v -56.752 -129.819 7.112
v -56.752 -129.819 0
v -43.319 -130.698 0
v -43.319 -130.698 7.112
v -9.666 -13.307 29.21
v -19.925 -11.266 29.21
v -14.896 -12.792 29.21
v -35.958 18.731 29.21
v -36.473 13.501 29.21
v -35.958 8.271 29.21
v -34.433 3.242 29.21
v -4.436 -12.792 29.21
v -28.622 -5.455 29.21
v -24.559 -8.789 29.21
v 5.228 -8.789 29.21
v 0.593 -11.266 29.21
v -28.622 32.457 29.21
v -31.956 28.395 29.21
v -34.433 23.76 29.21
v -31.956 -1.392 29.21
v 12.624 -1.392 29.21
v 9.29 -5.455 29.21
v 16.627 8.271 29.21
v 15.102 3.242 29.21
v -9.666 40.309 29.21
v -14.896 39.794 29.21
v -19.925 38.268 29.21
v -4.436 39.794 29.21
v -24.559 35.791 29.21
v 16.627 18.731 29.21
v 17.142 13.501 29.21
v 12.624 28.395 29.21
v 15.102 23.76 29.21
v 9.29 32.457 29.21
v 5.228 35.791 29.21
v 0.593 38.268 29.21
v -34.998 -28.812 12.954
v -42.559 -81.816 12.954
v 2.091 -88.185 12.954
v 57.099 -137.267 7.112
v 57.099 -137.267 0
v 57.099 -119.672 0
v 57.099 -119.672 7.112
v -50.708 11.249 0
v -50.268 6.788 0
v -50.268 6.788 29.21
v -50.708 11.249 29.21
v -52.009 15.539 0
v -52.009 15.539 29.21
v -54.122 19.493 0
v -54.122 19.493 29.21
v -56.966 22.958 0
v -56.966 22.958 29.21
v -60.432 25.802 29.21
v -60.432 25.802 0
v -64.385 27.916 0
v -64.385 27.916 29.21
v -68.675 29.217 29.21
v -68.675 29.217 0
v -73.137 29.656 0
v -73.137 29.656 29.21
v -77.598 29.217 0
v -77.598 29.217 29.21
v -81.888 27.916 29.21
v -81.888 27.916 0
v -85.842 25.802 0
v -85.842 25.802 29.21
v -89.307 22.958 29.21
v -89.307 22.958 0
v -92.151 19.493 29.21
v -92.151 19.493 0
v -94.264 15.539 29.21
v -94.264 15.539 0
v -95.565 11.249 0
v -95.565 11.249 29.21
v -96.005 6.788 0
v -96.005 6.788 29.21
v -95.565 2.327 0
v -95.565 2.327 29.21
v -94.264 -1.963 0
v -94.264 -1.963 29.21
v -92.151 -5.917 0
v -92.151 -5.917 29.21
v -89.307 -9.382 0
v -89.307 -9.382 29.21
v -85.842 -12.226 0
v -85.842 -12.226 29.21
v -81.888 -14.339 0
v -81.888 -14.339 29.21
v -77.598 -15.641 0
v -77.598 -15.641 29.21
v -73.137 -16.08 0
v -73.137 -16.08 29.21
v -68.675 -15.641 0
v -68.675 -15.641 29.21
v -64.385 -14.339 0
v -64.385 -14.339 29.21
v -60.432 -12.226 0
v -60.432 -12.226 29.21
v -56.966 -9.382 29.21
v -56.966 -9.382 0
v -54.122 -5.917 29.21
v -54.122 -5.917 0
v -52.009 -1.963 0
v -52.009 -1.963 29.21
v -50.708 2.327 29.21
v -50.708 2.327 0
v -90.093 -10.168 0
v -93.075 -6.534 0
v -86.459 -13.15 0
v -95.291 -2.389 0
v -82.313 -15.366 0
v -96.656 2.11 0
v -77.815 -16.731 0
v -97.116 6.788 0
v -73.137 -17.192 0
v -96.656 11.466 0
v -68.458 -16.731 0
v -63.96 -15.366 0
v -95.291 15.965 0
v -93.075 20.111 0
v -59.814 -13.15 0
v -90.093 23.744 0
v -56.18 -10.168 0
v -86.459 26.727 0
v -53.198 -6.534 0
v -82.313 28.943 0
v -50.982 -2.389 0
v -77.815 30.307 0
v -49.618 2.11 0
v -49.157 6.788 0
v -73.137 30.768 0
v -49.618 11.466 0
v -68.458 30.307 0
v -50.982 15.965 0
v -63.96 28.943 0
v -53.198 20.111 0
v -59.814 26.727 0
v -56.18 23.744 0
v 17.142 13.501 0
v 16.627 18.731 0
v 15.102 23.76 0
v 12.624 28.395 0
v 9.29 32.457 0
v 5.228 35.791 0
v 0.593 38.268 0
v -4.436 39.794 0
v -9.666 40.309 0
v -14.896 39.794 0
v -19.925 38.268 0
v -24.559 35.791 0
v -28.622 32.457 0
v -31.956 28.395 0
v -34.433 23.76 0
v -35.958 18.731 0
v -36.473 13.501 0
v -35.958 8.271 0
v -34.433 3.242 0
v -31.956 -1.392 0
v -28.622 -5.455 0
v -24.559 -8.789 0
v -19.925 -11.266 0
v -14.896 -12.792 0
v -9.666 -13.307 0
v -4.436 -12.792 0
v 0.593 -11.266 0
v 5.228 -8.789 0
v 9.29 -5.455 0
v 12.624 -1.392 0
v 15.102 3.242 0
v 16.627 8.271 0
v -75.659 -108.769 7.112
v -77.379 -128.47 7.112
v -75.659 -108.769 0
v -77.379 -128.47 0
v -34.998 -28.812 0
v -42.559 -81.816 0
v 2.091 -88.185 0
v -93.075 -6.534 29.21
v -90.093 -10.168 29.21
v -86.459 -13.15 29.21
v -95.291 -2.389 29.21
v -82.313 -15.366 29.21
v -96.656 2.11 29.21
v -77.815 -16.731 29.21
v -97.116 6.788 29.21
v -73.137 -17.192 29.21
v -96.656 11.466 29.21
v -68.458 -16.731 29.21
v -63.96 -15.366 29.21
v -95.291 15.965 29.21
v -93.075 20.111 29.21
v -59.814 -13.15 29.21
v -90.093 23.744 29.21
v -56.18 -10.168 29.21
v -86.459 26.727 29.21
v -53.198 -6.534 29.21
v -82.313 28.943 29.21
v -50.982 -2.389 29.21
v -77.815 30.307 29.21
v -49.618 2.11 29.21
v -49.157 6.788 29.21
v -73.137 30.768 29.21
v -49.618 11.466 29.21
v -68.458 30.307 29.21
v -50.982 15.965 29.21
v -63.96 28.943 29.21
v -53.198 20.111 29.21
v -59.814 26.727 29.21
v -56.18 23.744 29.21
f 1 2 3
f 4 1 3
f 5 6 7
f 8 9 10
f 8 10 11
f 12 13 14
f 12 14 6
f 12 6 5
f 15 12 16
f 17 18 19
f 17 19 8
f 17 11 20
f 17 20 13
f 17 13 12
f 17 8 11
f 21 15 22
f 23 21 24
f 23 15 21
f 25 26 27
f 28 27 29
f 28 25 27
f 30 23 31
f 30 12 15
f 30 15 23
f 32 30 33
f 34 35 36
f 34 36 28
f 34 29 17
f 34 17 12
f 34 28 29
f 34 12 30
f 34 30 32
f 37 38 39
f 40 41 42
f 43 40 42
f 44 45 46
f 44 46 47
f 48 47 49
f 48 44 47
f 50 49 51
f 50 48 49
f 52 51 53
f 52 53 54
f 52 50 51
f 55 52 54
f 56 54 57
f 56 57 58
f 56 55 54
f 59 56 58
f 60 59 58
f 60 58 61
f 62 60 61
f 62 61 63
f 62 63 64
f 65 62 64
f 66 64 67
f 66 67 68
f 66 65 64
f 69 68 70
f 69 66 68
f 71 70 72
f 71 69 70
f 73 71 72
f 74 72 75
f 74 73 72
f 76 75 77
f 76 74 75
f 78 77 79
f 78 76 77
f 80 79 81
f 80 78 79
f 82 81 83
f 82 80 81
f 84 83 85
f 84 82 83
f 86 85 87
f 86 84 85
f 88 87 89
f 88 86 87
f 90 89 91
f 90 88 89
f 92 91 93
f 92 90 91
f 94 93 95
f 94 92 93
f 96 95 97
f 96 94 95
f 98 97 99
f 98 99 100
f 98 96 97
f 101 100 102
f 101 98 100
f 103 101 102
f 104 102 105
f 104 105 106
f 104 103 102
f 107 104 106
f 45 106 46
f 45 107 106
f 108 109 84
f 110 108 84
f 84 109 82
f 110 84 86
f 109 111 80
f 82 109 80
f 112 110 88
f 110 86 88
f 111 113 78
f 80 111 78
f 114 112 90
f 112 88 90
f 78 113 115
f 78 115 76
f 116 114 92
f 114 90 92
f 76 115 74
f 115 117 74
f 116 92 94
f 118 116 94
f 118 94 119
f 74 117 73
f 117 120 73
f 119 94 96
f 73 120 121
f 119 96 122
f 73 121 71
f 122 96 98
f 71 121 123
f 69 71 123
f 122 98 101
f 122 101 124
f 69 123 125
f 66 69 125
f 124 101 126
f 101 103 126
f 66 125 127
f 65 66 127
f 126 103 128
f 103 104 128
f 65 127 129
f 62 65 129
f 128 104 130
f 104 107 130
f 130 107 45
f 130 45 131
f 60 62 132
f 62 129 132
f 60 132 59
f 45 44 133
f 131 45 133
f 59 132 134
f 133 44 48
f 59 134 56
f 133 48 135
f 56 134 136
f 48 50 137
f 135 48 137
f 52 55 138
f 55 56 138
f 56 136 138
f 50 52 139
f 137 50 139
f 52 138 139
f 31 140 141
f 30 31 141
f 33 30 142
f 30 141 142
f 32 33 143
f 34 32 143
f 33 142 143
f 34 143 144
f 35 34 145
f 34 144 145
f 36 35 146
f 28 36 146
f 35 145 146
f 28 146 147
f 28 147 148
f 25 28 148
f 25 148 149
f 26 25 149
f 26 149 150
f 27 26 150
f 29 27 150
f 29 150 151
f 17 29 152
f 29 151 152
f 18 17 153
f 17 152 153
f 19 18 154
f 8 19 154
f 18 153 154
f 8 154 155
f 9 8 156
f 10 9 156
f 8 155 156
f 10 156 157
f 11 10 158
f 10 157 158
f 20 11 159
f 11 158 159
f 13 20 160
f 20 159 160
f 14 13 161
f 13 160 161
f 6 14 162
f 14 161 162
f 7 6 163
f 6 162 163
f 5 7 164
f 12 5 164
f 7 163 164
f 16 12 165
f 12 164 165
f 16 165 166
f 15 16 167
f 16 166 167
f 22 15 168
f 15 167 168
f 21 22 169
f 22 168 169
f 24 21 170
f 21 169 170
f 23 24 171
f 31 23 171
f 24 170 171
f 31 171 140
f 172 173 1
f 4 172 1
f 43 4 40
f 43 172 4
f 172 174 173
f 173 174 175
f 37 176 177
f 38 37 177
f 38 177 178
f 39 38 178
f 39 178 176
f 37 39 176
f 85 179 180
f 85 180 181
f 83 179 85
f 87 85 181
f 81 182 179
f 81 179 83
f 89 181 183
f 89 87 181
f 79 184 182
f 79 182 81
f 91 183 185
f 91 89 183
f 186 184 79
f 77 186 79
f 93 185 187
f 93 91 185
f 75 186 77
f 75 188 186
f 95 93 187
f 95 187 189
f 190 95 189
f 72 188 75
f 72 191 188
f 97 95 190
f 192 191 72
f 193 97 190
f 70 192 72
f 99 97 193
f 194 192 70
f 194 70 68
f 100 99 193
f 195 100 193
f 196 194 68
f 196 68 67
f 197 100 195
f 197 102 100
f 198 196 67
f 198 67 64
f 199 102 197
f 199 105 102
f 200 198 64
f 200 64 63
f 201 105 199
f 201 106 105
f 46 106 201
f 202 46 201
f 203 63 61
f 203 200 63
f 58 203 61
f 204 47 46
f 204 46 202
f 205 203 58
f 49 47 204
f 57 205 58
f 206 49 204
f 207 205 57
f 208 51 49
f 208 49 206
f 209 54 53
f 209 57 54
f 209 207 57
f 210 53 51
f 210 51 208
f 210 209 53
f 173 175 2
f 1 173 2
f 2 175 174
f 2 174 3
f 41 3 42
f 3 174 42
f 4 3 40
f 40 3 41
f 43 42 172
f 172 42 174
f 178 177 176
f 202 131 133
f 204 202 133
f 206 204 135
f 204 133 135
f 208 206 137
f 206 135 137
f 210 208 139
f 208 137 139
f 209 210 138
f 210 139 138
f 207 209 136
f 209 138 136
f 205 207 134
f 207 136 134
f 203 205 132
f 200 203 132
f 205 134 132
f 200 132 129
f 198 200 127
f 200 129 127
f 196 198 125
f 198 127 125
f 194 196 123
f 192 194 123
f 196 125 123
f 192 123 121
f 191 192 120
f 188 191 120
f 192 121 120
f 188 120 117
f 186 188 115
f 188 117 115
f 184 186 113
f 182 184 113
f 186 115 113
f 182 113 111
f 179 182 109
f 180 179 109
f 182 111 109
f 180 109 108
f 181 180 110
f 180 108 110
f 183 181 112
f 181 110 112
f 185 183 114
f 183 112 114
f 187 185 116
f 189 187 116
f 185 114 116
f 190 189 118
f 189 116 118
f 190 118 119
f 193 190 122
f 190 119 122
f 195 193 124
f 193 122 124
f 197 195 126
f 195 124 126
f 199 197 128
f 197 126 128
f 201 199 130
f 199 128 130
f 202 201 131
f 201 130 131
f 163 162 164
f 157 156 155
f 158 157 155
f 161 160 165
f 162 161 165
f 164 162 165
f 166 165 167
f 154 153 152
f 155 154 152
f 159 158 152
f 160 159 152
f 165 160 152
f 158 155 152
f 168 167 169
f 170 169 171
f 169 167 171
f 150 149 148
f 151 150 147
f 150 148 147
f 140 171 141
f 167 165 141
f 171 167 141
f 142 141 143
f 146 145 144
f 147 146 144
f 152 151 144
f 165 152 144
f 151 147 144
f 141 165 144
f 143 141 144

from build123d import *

# Parameters (mm, degrees)
F0_R     = 26.807841
F0_R_2   = 23.979846
F0_R_3   = 22.868274
F1_DEPTH = 29.21
F3_DEPTH = 12.954
F5_DEPTH = 7.112


with BuildPart() as f1:
    # F0 (on Top) → F1 (new body)
    with BuildSketch(Plane.XY):
        with Locations((-9.665625, 13.501139)):
            Circle(F0_R)
        with Locations((-73.136605, 6.788054)):
            Circle(F0_R_2)
        with Locations((-73.136605, 6.788054)):
            Circle(F0_R_3, mode=Mode.SUBTRACT)
    extrude(amount=F1_DEPTH)


with BuildPart() as f3:
    # F2 (on Top) → F3 (new body)
    with BuildSketch(Plane.XY):
        Polygon((2.091387, -88.18549), (-34.998138, -28.811608), (-42.559069, -81.816256), align=None)
    extrude(amount=F3_DEPTH)


with BuildPart() as f5:
    # F4 (on Top) → F5 (new body)
    with BuildSketch(Plane.XY):
        Polygon((57.098739, -119.67203), (-75.658582, -108.768702), (-77.379428, -128.469676), (-56.752082, -129.81913), (-43.319212, -130.697916), (57.098739, -137.267321), align=None)
    extrude(amount=F5_DEPTH)


solid = Compound([f1.part, f3.part, f5.part])
